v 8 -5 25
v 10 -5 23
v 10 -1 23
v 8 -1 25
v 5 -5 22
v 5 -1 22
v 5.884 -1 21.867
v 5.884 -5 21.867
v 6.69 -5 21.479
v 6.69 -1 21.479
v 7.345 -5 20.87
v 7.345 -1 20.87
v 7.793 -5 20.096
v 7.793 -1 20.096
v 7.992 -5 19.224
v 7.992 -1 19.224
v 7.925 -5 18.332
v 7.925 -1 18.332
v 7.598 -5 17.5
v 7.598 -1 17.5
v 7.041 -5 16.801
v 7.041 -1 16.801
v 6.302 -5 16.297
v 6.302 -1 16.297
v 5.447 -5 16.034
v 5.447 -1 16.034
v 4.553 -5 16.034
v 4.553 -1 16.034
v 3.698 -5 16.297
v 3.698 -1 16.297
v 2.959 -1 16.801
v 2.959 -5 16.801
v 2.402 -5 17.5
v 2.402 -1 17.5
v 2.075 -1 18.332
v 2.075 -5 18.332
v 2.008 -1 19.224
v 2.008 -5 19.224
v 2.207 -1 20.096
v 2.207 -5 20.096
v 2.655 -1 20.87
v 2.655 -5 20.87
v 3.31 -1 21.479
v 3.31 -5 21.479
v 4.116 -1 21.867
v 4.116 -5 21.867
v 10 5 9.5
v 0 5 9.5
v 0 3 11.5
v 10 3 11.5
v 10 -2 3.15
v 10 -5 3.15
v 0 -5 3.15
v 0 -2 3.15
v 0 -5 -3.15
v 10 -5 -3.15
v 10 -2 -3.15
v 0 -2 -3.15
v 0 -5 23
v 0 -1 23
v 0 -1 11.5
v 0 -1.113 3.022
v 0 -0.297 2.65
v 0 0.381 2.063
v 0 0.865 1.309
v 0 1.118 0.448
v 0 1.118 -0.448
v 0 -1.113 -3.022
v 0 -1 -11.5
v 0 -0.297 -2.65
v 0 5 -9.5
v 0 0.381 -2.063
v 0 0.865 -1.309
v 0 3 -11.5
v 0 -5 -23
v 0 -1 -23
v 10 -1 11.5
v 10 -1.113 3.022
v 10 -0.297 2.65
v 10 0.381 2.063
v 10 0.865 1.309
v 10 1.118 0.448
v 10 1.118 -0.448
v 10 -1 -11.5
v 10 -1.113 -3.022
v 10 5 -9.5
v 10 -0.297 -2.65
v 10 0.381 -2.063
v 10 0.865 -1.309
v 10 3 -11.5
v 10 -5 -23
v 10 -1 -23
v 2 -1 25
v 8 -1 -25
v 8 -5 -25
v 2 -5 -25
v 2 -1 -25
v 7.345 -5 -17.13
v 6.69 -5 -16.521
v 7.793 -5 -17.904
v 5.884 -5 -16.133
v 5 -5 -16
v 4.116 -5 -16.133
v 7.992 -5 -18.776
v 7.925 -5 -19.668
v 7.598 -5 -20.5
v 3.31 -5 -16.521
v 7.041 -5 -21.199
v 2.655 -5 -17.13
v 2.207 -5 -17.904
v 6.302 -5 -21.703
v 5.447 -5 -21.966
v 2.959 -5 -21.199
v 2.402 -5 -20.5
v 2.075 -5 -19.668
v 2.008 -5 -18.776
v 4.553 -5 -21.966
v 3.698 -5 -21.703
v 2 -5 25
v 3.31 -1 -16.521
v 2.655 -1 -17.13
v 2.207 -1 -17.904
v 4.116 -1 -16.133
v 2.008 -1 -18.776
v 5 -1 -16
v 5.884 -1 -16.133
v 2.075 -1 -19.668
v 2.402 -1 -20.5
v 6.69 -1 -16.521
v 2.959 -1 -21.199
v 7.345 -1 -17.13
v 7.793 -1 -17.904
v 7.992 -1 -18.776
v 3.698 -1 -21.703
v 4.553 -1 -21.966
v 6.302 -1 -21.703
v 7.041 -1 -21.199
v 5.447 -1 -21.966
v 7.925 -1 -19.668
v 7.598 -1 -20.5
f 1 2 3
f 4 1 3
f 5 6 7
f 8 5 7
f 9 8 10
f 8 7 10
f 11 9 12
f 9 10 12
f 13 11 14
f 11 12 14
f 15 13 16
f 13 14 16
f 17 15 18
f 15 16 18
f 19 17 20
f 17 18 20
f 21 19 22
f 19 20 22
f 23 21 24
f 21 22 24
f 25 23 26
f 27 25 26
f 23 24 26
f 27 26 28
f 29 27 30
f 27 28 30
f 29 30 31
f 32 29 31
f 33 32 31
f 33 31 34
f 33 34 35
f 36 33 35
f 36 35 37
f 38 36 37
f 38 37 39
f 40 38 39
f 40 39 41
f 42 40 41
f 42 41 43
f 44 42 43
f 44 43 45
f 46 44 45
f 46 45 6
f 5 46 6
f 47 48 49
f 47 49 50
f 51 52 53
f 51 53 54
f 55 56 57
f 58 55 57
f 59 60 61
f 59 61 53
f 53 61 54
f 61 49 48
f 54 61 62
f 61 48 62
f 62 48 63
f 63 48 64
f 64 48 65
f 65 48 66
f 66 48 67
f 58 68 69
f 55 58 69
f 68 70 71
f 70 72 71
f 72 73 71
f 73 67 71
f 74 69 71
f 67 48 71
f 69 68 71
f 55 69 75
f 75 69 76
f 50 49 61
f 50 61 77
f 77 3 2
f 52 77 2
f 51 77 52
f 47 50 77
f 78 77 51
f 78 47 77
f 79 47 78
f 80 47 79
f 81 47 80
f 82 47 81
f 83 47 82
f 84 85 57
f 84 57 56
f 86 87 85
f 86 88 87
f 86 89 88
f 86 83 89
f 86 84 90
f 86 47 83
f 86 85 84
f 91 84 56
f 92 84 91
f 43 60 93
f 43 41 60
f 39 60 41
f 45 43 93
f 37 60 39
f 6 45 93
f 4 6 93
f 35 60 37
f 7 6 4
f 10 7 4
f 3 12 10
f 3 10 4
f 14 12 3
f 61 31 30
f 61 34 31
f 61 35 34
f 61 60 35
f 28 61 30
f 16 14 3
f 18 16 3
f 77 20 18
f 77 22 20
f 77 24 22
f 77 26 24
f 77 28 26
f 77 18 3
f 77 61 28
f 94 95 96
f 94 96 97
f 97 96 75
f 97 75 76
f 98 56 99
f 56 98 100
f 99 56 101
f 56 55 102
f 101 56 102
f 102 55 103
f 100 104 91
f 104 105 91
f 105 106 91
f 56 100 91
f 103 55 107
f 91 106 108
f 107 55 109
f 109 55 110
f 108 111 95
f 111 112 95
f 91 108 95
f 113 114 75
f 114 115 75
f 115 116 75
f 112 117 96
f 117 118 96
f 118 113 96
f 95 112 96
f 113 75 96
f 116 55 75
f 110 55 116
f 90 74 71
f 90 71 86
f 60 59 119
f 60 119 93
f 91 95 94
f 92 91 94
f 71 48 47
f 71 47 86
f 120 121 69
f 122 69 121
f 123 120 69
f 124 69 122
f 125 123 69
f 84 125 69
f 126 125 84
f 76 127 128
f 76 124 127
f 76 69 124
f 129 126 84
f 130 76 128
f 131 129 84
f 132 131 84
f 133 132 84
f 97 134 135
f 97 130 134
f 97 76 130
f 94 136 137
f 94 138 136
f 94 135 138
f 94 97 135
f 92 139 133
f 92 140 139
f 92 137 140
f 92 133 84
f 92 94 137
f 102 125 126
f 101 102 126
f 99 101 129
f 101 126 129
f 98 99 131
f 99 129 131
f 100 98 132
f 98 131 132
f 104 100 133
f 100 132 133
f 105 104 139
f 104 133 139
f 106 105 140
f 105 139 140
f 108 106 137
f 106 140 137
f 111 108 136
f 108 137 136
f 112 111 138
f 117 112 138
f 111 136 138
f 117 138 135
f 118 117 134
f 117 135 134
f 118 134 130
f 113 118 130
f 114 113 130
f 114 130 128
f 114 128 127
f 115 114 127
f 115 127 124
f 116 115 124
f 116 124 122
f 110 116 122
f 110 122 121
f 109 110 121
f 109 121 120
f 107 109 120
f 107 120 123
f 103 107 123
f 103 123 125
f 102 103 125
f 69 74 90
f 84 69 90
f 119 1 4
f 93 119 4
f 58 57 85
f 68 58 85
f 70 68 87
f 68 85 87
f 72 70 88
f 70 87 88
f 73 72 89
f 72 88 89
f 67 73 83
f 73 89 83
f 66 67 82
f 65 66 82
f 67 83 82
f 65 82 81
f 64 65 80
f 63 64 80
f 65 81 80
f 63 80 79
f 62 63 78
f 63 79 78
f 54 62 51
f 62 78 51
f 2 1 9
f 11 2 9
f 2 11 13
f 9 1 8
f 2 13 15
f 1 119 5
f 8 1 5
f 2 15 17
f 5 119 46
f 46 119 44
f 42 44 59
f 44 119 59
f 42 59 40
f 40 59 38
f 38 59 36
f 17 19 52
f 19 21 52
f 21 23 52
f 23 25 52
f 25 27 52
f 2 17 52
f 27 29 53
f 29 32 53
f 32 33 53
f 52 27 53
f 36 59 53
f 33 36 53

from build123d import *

# Parameters (mm, degrees)
SKETCH1_W           = 50
SKETCH1_H           = 10
BOSS_EXTRUDE1_DEPTH = 10
SKETCH3_W           = 10
SKETCH3_H           = 13.5
CUT_EXTRUDE1_DEPTH  = 6
SKETCH4_R           = 3
CUT_EXTRUDE2_DEPTH  = 6
SKETCH5_R           = 3.15
SKETCH5_W           = 6.3
SKETCH5_H           = 7.480912946
CUT_EXTRUDE3_DEPTH  = 28.386127875
CHAMFER1_SIZE       = 2


with BuildPart() as part:
    # Sketch1 → Boss-Extrude1 (new body)
    with BuildSketch(Plane(origin=(0, 0, 0), x_dir=(0, 0, -1), z_dir=(1, 0, 0))):
        Rectangle(SKETCH1_W, SKETCH1_H)
    extrude(amount=BOSS_EXTRUDE1_DEPTH)

    # Sketch3 → Cut-Extrude1 (cut)
    with BuildSketch(Plane(origin=(0, 5, 0), x_dir=(1, 0, 0), z_dir=(0, 1, 0))):
        with Locations((5, -18.25)):
            Rectangle(SKETCH3_W, SKETCH3_H)
        with Locations((5, 18.25)):
            Rectangle(SKETCH3_W, SKETCH3_H)
    extrude(amount=-CUT_EXTRUDE1_DEPTH, mode=Mode.SUBTRACT)

    # Sketch4 → Cut-Extrude2 (cut)
    with BuildSketch(Plane(origin=(0, -1, 0), x_dir=(1, 0, 0), z_dir=(0, 1, 0))):
        with Locations(Location((5, 19, 0), (0, 0, 270))):
            Circle(SKETCH4_R)
        with Locations(Location((5, -19, 0), (0, 0, 270))):
            Circle(SKETCH4_R)
    extrude(amount=-CUT_EXTRUDE2_DEPTH, mode=Mode.SUBTRACT)

    # Sketch5 → Cut-Extrude3 (cut, through all)
    with BuildSketch(Plane(origin=(10, 0, 0), x_dir=(0, 0, -1), z_dir=(1, 0, 0))):
        with Locations((0, -2)):
            Circle(SKETCH5_R)
        with Locations((0, -5.740456473)):
            Rectangle(SKETCH5_W, SKETCH5_H)
    extrude(amount=-CUT_EXTRUDE3_DEPTH, mode=Mode.SUBTRACT)

    # Chamfer1
    chamfer1_edges = [part.edges().sort_by_distance(p)[0] for p in [
        (0, -3, 25),
        (10, -3, 25),
        (5, 5, 11.5),
        (5, 5, -11.5),
        (10, -3, -25),
        (0, -3, -25),
    ]]
    chamfer(chamfer1_edges, length=CHAMFER1_SIZE)


solid = part.part
